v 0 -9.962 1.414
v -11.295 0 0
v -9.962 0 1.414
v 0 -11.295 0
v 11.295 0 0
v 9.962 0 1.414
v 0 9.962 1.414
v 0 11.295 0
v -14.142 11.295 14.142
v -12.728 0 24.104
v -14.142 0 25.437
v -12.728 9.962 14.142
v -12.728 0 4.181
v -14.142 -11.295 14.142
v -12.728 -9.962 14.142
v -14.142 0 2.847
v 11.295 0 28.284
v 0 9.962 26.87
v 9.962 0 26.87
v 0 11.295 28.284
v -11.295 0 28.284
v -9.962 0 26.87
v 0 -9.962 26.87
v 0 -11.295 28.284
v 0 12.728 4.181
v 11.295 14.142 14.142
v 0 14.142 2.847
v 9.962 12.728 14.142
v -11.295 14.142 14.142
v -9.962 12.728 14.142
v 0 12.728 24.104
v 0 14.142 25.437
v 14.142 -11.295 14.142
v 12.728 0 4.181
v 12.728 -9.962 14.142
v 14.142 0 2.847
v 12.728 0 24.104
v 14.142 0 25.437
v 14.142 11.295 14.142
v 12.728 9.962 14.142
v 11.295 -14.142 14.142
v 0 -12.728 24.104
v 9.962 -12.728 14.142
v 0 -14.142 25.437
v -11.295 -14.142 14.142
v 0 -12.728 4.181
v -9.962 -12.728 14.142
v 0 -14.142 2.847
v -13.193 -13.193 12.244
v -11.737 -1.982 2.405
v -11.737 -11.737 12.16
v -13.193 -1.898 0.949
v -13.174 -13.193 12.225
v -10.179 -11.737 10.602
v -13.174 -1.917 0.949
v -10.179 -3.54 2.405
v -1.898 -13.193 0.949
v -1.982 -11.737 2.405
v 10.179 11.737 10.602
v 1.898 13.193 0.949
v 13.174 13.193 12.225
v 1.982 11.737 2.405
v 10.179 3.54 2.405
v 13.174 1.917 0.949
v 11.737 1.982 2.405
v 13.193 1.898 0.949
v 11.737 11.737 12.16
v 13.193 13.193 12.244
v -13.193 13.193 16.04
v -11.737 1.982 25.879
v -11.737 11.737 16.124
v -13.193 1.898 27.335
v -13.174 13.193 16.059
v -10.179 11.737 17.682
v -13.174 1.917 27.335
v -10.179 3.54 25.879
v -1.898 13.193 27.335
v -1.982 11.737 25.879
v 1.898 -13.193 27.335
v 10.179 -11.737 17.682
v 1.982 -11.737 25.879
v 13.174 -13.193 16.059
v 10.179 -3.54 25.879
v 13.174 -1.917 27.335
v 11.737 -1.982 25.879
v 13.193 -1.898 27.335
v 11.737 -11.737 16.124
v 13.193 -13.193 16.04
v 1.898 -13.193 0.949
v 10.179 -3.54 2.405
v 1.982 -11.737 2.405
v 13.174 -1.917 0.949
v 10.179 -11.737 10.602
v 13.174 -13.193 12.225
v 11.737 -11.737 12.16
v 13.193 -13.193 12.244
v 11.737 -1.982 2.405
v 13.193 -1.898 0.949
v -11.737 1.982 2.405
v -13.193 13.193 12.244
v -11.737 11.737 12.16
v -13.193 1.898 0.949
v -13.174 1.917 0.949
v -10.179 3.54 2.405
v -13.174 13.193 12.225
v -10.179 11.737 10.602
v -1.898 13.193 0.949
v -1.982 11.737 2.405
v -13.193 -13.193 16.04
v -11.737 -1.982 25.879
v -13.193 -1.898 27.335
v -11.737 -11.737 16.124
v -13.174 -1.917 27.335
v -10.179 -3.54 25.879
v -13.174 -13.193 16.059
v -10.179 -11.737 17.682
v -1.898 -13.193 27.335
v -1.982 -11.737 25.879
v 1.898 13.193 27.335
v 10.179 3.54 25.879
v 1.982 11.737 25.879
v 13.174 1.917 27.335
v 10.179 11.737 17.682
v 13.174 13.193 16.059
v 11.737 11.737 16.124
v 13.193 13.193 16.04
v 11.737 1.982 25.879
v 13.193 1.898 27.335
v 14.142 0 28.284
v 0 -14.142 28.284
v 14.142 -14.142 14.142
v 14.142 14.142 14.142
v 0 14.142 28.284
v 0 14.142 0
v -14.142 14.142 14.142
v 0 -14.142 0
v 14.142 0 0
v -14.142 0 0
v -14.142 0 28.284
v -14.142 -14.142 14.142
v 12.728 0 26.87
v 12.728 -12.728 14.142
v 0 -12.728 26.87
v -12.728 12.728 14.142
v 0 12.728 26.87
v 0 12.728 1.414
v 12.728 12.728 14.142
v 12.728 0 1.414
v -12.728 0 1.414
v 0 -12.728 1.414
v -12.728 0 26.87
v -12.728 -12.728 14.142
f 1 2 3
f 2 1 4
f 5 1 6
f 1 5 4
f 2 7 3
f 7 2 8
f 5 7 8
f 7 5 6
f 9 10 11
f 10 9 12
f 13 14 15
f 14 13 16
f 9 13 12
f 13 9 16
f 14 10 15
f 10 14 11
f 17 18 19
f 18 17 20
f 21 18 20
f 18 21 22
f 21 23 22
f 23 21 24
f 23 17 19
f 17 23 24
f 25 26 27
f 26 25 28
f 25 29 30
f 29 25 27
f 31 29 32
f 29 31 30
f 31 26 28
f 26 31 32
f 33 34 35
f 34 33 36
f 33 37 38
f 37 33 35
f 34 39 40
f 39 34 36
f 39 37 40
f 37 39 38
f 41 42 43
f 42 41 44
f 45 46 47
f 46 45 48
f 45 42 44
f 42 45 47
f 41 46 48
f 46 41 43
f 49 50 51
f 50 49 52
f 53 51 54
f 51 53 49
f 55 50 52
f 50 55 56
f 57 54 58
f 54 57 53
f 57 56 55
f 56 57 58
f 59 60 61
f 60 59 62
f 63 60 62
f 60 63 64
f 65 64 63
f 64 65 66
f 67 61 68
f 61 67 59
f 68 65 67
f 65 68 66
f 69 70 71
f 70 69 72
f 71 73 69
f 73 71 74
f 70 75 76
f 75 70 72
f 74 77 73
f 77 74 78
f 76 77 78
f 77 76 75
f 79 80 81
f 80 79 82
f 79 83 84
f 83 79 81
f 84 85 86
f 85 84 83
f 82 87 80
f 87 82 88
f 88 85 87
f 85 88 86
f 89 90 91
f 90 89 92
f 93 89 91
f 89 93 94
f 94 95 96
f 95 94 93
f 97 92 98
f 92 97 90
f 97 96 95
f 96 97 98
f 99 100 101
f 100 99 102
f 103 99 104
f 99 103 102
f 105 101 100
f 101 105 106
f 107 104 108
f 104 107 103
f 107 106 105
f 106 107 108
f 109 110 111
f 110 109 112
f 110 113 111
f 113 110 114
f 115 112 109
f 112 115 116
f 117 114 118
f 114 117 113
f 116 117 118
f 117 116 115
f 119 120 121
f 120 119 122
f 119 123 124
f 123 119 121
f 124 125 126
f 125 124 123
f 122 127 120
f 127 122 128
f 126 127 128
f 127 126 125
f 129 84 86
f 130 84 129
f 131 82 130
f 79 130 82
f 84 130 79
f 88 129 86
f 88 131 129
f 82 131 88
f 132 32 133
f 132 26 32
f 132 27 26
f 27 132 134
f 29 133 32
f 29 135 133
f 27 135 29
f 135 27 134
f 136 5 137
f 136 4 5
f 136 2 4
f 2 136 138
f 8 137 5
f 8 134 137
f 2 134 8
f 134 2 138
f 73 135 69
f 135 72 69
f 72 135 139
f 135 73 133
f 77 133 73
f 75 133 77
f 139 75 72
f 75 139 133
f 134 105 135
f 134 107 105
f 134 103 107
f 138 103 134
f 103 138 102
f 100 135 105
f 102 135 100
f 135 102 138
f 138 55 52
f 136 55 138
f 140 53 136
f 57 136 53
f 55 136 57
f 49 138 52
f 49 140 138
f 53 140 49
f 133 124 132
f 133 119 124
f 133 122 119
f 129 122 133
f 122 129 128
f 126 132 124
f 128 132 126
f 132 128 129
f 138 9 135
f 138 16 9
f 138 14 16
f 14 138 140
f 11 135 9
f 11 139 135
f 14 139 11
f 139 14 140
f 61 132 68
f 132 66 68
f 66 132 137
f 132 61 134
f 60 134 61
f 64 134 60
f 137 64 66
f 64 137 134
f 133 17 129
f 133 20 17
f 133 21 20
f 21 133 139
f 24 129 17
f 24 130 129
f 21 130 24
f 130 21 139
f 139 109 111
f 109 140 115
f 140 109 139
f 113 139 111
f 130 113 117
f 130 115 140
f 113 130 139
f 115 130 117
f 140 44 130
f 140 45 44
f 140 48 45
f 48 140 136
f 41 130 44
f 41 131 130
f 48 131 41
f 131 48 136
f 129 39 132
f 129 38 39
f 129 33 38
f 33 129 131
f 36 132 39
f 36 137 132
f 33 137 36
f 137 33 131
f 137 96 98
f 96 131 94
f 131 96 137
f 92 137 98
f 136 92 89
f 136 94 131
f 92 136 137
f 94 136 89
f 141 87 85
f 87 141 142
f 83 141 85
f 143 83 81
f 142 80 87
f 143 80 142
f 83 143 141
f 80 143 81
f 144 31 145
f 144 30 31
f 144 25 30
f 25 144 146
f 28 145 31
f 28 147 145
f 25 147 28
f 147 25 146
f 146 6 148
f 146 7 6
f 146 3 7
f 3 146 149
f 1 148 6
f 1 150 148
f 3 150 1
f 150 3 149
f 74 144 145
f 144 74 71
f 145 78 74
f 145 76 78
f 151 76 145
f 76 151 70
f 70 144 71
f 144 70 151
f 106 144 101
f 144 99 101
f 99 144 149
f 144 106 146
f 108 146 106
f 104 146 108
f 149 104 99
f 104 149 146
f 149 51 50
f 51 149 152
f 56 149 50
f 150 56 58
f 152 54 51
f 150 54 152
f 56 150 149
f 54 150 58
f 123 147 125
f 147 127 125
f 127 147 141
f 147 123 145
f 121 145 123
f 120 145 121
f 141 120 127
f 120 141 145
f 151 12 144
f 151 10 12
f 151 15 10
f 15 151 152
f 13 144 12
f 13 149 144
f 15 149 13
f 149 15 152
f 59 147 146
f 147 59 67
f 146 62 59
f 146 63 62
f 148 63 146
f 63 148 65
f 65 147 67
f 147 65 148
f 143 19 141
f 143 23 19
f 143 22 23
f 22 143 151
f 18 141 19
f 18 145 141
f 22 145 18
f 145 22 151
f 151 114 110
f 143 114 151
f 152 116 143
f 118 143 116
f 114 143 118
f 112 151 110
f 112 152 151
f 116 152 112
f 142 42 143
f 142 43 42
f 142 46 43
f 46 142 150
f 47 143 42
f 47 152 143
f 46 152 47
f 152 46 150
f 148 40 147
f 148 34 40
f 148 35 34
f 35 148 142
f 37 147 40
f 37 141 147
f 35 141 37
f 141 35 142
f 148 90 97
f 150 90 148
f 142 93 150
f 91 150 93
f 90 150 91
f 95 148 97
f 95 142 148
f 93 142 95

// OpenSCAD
// Cuboctahedron

// base coordinates
// source:  http://dmccooey.com/polyhedra/Cuboctahedron.txt
// generated by  http://kitwallace.co.uk/3d/solid-to-scad.xq
Name = "Cuboctahedron";
// 4 sided faces = 6
// 3 sided faces = 8
C0 = 0.7071067811865475244008443621048;
points = [
[ C0, 0.0,  C0],
[ C0, 0.0, -C0],
[-C0, 0.0,  C0],
[-C0, 0.0, -C0],
[ C0,  C0, 0.0],
[ C0, -C0, 0.0],
[-C0,  C0, 0.0],
[-C0, -C0, 0.0],
[0.0,  C0,  C0],
[0.0,  C0, -C0],
[0.0, -C0,  C0],
[0.0, -C0, -C0]];
faces = [
[  4 ,  1,  5,  0],
[ 10 ,  2,  8,  0],
[  3 ,  6,  2,  7],
[ 10 ,  5, 11,  7],
[  3 , 11,  1,  9],
[  4 ,  8,  6,  9],
[  8 ,  4,  0],
[ 11 ,  5,  1],
[ 10 ,  7,  2],
[  9 ,  6,  3],
[  9 ,  1,  4],
[ 10 ,  0,  5],
[  8 ,  2,  6],
[ 11 ,  3,  7]];
edges = [
[1,4],
[1,5],
[0,5],
[0,4],
[2,10],
[2,8],
[0,8],
[0,10],
[3,6],
[2,6],
[2,7],
[3,7],
[5,10],
[5,11],
[7,11],
[7,10],
[3,11],
[1,11],
[1,9],
[3,9],
[4,8],
[6,8],
[6,9],
[4,9]];
// --------------------------------- 


// cut holes out of shell
eps=0.02;
radius=20;
shell_ratio=0.1;
prism_base_ratio =0.8;
prism_height_ratio=0.3;
prism_scale=0.5;
nfaces = [];
scale=1;

//insert

spoints = normalize(centre_points(points),radius);
sfaces = lhs_faces(faces,spoints);
cfaces =  select_nsided_faces(sfaces,nfaces);

module shape() {
   difference() {
      polyhedron(spoints,sfaces);
      scale(1-shell_ratio) polyhedron(spoints,sfaces);
     face_prisms_in(cfaces,spoints,prism_base_ratio,prism_scale,prism_height_ratio);
   }
};

scale(scale)
 place_on_largest_face(sfaces,spoints)
   shape();
 


// ruler(10);

// functions for the construction of polyhedra
// chris wallace
// see http://kitwallace.tumblr.com/tagged/polyhedra for info


//  functions for creating the matrices for transforming a single point

function m_translate(v) = [ [1, 0, 0, 0],
                            [0, 1, 0, 0],
                            [0, 0, 1, 0],
                            [v.x, v.y, v.z, 1  ] ];
                            
function m_rotate(v) =  [ [1,  0,         0,        0],
                          [0,  cos(v.x),  sin(v.x), 0],
                          [0, -sin(v.x),  cos(v.x), 0],
                          [0,  0,         0,        1] ]
                      * [ [ cos(v.y), 0,  -sin(v.y), 0],
                          [0,         1,  0,        0],
                          [ sin(v.y), 0,  cos(v.y), 0],
                          [0,         0,  0,        1] ]
                      * [ [ cos(v.z),  sin(v.z), 0, 0],
                          [-sin(v.z),  cos(v.z), 0, 0],
                          [ 0,         0,        1, 0],
                          [ 0,         0,        0, 1] ];
                            
function vec3(v) = [v.x, v.y, v.z];
function transform(v, m)  = vec3([v.x, v.y, v.z, 1] * m);
                            
function matrix_to(p0, p) = 
                       m_rotate([0, atan2(sqrt(pow(p[0], 2) + pow(p[1], 2)), p[2]), 0]) 
                     * m_rotate([0, 0, atan2(p[1], p[0])]) 
                     * m_translate(p0);

function matrix_from(p0, p) = 
                      m_translate(-p0)
                      * m_rotate([0, 0, -atan2(p[1], p[0])]) 
                      * m_rotate([0, -atan2(sqrt(pow(p[0], 2) + pow(p[1], 2)), p[2]), 0]); 

function transform_points(list, matrix, i = 0) = 
    i < len(list) 
       ? concat([ transform(list[i], matrix) ], transform_points(list, matrix, i + 1))
       : [];


//  convert from point indexes to point coordinates

function as_points(indexes,points,i=0) =
     i < len(indexes) 
        ?  concat([points[indexes[i]]], as_points(indexes,points,i+1))
        : [];

//  basic vector functions
function normal_r(face) =
     cross(face[1]-face[0],face[2]-face[0]);

function normal(face) =
     - normal_r(face) / norm(normal_r(face));

function centre(points) = 
      vsum(points) / len(points);

// sum a list of vectors
function vsum(points,i=0) =  
      i < len(points)
        ?  (points[i] + vsum(points,i+1))
        :  [0,0,0];

function ssum(list,i=0) =  
      i < len(list)
        ?  (list[i] + ssum(list,i+1))
        :  0;


// add a vector to a list of vectors
function vadd(points,v,i=0) =
      i < len(points)
        ?  concat([points[i] + v], vadd(points,v,i+1))
        :  [];

function reverse_r(v,n) =
      n == 0 
        ? [v[0]]
        : concat([v[n]],reverse_r(v,n-1));

function reverse(v) = reverse_r(v, len(v)-1);

function sum_norm(points,i=0) =
    i < len(points)
       ?  norm(points[i]) + sum_norm(points,i+1)
       : 0 ;

function average_radius(points) =
       sum_norm(points) / len(points);


// select one dimension of a list of vectors
function slice(v,k,i=0) =
   i <len(v)
      ?  concat([v[i][k]], slice(v,k,i+1))
      : [];

function max(v, max=-9999999999999999,i=0) =
     i < len(v) 
        ?  v[i] > max 
            ?  max(v, v[i], i+1 )
            :  max(v, max, i+1 ) 
        : max;

function min(v, min=9999999999999999,i=0) =
     i < len(v) 
        ?  v[i] < min 
            ?  min(v, v[i], i+1 )
            :  min(v, min, i+1 ) 
        : min;

function project(pts,i=0) =
     i < len(pts)
        ? concat([[pts[i][0],pts[i][1]]], project(pts,i+1))
        : [];
        
function contains(n, list, i=0) =
     i < len(list) 
        ?  n == list[i]
           ?  true
           :  contains(n,list,i+1)
        : false;

// normalize the points to have origin at 0,0,0 
function centre_points(points) = 
     vadd(points, - centre(points));

//scale to average radius = radius
function normalize(points,radius) =
    points * radius /average_radius(points);
 
function select_nsided_faces(faces,nsides,i=0) =
  len(nsides) == 0
     ?  faces
     :  i < len(faces)
         ?  contains(len(faces[i]), nsides)
             ? concat([faces[i]],  select_nsided_faces(faces,nsides,i+1))
             : select_nsided_faces(faces,nsides,i+1)
         : [];
         
function longest_edge(face,max=-1,i=0) =
       i < len(face)
          ?  norm(face[i] - face[(i+1)% len(face)]) > max
             ?  longest_edge(face, norm(face[i] - face[(i+1)% len(face)]),i+1)
             :  longest_edge(face, max,i+1)
          : max ;

function point_edges(point,edges,i=0) =
    i < len(edges) 
       ? point == edges[i][0] || point == edges[i][1]
         ? concat([edges[i]], point_edges(point,edges,i+1))
         : point_edges(point,edges,i+1)
       : [];

function select_nedged_points(points,edges,nedges,i=0) =
     i < len(points) 
         ?  len(point_edges(i,edges)) == nedges
             ? concat([i],  select_nedged_points(points,edges,nedges,i+1))
             : select_nedged_points(points,edges,nedges,i+1)
         : [];

function triangle(a,b) = norm(cross(a,b))/2;

function face_area_centre(face,centre,i=0) =
    i < len(face)
       ?  triangle(
                face[i] - centre,
                face[(i+1) % len(face)] - centre)
          + face_area_centre(face,centre,i+1)
       : 0 ;

function face_area(face) = face_area_centre(face,centre(face));

function face_areas(faces,points,i=0) =
   i < len(faces)
      ? concat([[i,  face_area(as_points(faces[i],points))]] ,
               face_areas(faces,points,i+1))
      : [] ;
 
function max_area(areas, max=[-1,-1], i=0) =
   i <len(areas)
      ? areas[i][1] > max[1]
         ?  max_area(areas,areas[i],i+1)
         :  max_area(areas,max,i+1)
      : max;


function bbox(v) = [
   [min(slice(spoints,0)), max(slice(spoints,0))],
   [min(slice(spoints,1)), max(slice(spoints,1))],
   [min(slice(spoints,2)), max(slice(spoints,2))]
];

// check that all faces have a lhs orientation
function cosine_between(u, v) =(u * v) / (norm(u) * norm(v));

function lhs_faces(faces,points,i=0) =
     i < len(faces) 
        ?  cosine_between(normal(as_points(faces[i],points)),
                         centre(as_points(faces[i],points))) < 0
            ?  concat([reverse(faces[i])],lhs_faces(faces,points,i+1))
            :  concat([faces[i]],lhs_faces(faces,points,i+1))
        : [] ;


function fs(p) = f(p[0],p[1],p[2]);

function modulate_point(p) =
    spherical_to_xyz(fs(xyz_to_spherical(p)));

function modulate_points(points,i=0) =
   i < len(points)
      ? concat([modulate_point(points[i])],modulate_points(points,i+1))
      : [];

function xyz_to_spherical(p) =
    [ norm(p), acos(p.z/ norm(p)), atan2(p.x,p.y)] ;

function spherical_to_xyz_full(r,theta,phi) =
    [ r * sin(theta) * cos(phi),
      r * sin(theta) * sin(phi),
      r * cos(theta)];

function spherical_to_xyz(s) =
     spherical_to_xyz_full(s[0],s[1],s[2]);

function select_large_faces(faces,points, min,i=0) =
  i < len(faces)
     ?  face_area(as_points(faces[i],points)) > min
       ? concat([faces[i]],  select_large_faces(faces,points,min,i+1))
       :select_large_faces(faces,points,min,i+1)     
     : [];
        
function lower(char) =
    contains(char,"abcdefghijklmnopqrstuvwxyz") ;

function char_layer(char) =
    lower(char) 
         ? str(char,"_")
         : char;

module write_char(font,char) {
	linear_extrude(height=1,convexity=10) 
      import(file=str("write/",font,".dxf"),layer=char_layer(char));
};

module write_centred_char(font,char) {
	linear_extrude(height=1,convexity=10) 
      translate([-2.5,-4,0])
          import(file=str("write/",font,".dxf"),layer=char_layer(char));
};
module engrave_face_word(faces,points,word,font,ratio,thickness) {
    for (i=[0:len(faces) - 1]) 
      if (i <len(word))
        assign (f = as_points(faces[i],points)) 
        assign (n = normal(f), c = centre(f))
        assign(s = longest_edge(f) / 20* ratio)
           orient_to(c,n)  
                translate([0,0,-thickness+eps])
                     scale([s,s,thickness])
                          write_centred_char(font,word[i]);
}
                          
module orient_to(centre, normal) {   
      translate(centre)
      rotate([0, 0, atan2(normal[1], normal[0])]) //rotation
      rotate([0, atan2(sqrt(pow(normal[0], 2)+pow(normal[1], 2)),normal[2]), 0])
      children();
}

module orient_from(centre, normal) {   
      rotate([0, -atan2(sqrt(pow(normal[0], 2)+pow(normal[1], 2)),normal[2]), 0])
      rotate([0, 0, -atan2(normal[1], normal[0])]) //rotation
      translate(-centre)
      children();
}

module place_on_largest_face(faces,points) {
  assign (largest = max_area(face_areas(faces,points)))
  assign (lpoints = as_points(faces[largest[0]],points))
  assign (n = normal(lpoints),c = centre(lpoints))
  orient_from(c,-n)
  children();
}
              
module make_edge(edge, points, r) {
    assign(p0 = points[edge[0]], p1 = points[edge[1]])
    assign(v = p1 -p0 )
     orient_to(p0,v)
       cylinder(r=r, h=norm(v)); 
}

module make_edges(points, edges, r) {
   for (i =[0:len(edges)-1])
      make_edge(edges[i],points, r);
}

module make_vertices(points,r) { 
   for (i = [0:len(points)-1])
      translate(points[i]) sphere(r); 
}

module face_prism (face,prism_base_ratio,prism_scale,prism_height_ratio) {
    assign (n = normal(face), c= centre(face))
    assign (m = matrix_from(c,n))
    assign (tpts =  prism_base_ratio * transform_points(face,m))
    assign (max_length = longest_edge(face))
    assign (xy = project(tpts)) 
      linear_extrude(height=prism_height_ratio * max_length, scale=prism_scale) 
          polygon(points=xy);
}

module face_prisms_in(faces,points,prism_base_ratio,prism_scale,prism_height_ratio) {
    for (i=[0:len(faces) - 1]) 
       assign (f = as_points(faces[i],points)) 
       assign (n = normal(f), c = centre(f))
       orient_to(c,n) 
          translate([0,0,eps]) 
               mirror() rotate([0,180,0]) 
                   face_prism(f,prism_base_ratio,prism_scale,prism_height_ratio);
}

module face_prisms_out(faces,points,prism_base_ratio,prism_scale,prism_height_ratio) {
    for (i=[0:len(faces) - 1]) 
       assign (f = as_points(faces[i],points)) 
       assign (n = normal(f), c = centre(f))
       orient_to(c,n) 
          translate([0,0,-eps]) 
               face_prism(f,prism_base_ratio,prism_scale,prism_height_ratio);
}

module face_prisms_through(faces,points,prism_base_ratio,prism_scale,prism_height_ratio) {
    for (i=[0:len(faces) - 1]) 
       assign (f = as_points(faces[i],points)) 
       assign (n = normal(f), c = centre(f))
       orient_to(c,n) 
          translate([0,0,prism_height_ratio*longest_edge(f)/2]) 
               mirror() rotate([0,180,0]) 
                   face_prism(f,prism_base_ratio,prism_scale,prism_height_ratio);
}
module ruler(n) {
   for (i=[0:n-1]) 
       translate([(i-n/2 +0.5)* 10,0,0]) cube([9.8,5,2], center=true);
}

module ground(size=50) {
   translate([0,0,-size]) cube(2*size,center=true);
}

module cross_section(size=50) {
   translate([0,0,-size]) cube(2*size);
}

module ring(radius,thickness,height) {
   difference() {
      cylinder(h=height,r=radius);
      translate([0,0,-eps]) cylinder(h=height+2*eps,r=radius - thickness);
   }
}
